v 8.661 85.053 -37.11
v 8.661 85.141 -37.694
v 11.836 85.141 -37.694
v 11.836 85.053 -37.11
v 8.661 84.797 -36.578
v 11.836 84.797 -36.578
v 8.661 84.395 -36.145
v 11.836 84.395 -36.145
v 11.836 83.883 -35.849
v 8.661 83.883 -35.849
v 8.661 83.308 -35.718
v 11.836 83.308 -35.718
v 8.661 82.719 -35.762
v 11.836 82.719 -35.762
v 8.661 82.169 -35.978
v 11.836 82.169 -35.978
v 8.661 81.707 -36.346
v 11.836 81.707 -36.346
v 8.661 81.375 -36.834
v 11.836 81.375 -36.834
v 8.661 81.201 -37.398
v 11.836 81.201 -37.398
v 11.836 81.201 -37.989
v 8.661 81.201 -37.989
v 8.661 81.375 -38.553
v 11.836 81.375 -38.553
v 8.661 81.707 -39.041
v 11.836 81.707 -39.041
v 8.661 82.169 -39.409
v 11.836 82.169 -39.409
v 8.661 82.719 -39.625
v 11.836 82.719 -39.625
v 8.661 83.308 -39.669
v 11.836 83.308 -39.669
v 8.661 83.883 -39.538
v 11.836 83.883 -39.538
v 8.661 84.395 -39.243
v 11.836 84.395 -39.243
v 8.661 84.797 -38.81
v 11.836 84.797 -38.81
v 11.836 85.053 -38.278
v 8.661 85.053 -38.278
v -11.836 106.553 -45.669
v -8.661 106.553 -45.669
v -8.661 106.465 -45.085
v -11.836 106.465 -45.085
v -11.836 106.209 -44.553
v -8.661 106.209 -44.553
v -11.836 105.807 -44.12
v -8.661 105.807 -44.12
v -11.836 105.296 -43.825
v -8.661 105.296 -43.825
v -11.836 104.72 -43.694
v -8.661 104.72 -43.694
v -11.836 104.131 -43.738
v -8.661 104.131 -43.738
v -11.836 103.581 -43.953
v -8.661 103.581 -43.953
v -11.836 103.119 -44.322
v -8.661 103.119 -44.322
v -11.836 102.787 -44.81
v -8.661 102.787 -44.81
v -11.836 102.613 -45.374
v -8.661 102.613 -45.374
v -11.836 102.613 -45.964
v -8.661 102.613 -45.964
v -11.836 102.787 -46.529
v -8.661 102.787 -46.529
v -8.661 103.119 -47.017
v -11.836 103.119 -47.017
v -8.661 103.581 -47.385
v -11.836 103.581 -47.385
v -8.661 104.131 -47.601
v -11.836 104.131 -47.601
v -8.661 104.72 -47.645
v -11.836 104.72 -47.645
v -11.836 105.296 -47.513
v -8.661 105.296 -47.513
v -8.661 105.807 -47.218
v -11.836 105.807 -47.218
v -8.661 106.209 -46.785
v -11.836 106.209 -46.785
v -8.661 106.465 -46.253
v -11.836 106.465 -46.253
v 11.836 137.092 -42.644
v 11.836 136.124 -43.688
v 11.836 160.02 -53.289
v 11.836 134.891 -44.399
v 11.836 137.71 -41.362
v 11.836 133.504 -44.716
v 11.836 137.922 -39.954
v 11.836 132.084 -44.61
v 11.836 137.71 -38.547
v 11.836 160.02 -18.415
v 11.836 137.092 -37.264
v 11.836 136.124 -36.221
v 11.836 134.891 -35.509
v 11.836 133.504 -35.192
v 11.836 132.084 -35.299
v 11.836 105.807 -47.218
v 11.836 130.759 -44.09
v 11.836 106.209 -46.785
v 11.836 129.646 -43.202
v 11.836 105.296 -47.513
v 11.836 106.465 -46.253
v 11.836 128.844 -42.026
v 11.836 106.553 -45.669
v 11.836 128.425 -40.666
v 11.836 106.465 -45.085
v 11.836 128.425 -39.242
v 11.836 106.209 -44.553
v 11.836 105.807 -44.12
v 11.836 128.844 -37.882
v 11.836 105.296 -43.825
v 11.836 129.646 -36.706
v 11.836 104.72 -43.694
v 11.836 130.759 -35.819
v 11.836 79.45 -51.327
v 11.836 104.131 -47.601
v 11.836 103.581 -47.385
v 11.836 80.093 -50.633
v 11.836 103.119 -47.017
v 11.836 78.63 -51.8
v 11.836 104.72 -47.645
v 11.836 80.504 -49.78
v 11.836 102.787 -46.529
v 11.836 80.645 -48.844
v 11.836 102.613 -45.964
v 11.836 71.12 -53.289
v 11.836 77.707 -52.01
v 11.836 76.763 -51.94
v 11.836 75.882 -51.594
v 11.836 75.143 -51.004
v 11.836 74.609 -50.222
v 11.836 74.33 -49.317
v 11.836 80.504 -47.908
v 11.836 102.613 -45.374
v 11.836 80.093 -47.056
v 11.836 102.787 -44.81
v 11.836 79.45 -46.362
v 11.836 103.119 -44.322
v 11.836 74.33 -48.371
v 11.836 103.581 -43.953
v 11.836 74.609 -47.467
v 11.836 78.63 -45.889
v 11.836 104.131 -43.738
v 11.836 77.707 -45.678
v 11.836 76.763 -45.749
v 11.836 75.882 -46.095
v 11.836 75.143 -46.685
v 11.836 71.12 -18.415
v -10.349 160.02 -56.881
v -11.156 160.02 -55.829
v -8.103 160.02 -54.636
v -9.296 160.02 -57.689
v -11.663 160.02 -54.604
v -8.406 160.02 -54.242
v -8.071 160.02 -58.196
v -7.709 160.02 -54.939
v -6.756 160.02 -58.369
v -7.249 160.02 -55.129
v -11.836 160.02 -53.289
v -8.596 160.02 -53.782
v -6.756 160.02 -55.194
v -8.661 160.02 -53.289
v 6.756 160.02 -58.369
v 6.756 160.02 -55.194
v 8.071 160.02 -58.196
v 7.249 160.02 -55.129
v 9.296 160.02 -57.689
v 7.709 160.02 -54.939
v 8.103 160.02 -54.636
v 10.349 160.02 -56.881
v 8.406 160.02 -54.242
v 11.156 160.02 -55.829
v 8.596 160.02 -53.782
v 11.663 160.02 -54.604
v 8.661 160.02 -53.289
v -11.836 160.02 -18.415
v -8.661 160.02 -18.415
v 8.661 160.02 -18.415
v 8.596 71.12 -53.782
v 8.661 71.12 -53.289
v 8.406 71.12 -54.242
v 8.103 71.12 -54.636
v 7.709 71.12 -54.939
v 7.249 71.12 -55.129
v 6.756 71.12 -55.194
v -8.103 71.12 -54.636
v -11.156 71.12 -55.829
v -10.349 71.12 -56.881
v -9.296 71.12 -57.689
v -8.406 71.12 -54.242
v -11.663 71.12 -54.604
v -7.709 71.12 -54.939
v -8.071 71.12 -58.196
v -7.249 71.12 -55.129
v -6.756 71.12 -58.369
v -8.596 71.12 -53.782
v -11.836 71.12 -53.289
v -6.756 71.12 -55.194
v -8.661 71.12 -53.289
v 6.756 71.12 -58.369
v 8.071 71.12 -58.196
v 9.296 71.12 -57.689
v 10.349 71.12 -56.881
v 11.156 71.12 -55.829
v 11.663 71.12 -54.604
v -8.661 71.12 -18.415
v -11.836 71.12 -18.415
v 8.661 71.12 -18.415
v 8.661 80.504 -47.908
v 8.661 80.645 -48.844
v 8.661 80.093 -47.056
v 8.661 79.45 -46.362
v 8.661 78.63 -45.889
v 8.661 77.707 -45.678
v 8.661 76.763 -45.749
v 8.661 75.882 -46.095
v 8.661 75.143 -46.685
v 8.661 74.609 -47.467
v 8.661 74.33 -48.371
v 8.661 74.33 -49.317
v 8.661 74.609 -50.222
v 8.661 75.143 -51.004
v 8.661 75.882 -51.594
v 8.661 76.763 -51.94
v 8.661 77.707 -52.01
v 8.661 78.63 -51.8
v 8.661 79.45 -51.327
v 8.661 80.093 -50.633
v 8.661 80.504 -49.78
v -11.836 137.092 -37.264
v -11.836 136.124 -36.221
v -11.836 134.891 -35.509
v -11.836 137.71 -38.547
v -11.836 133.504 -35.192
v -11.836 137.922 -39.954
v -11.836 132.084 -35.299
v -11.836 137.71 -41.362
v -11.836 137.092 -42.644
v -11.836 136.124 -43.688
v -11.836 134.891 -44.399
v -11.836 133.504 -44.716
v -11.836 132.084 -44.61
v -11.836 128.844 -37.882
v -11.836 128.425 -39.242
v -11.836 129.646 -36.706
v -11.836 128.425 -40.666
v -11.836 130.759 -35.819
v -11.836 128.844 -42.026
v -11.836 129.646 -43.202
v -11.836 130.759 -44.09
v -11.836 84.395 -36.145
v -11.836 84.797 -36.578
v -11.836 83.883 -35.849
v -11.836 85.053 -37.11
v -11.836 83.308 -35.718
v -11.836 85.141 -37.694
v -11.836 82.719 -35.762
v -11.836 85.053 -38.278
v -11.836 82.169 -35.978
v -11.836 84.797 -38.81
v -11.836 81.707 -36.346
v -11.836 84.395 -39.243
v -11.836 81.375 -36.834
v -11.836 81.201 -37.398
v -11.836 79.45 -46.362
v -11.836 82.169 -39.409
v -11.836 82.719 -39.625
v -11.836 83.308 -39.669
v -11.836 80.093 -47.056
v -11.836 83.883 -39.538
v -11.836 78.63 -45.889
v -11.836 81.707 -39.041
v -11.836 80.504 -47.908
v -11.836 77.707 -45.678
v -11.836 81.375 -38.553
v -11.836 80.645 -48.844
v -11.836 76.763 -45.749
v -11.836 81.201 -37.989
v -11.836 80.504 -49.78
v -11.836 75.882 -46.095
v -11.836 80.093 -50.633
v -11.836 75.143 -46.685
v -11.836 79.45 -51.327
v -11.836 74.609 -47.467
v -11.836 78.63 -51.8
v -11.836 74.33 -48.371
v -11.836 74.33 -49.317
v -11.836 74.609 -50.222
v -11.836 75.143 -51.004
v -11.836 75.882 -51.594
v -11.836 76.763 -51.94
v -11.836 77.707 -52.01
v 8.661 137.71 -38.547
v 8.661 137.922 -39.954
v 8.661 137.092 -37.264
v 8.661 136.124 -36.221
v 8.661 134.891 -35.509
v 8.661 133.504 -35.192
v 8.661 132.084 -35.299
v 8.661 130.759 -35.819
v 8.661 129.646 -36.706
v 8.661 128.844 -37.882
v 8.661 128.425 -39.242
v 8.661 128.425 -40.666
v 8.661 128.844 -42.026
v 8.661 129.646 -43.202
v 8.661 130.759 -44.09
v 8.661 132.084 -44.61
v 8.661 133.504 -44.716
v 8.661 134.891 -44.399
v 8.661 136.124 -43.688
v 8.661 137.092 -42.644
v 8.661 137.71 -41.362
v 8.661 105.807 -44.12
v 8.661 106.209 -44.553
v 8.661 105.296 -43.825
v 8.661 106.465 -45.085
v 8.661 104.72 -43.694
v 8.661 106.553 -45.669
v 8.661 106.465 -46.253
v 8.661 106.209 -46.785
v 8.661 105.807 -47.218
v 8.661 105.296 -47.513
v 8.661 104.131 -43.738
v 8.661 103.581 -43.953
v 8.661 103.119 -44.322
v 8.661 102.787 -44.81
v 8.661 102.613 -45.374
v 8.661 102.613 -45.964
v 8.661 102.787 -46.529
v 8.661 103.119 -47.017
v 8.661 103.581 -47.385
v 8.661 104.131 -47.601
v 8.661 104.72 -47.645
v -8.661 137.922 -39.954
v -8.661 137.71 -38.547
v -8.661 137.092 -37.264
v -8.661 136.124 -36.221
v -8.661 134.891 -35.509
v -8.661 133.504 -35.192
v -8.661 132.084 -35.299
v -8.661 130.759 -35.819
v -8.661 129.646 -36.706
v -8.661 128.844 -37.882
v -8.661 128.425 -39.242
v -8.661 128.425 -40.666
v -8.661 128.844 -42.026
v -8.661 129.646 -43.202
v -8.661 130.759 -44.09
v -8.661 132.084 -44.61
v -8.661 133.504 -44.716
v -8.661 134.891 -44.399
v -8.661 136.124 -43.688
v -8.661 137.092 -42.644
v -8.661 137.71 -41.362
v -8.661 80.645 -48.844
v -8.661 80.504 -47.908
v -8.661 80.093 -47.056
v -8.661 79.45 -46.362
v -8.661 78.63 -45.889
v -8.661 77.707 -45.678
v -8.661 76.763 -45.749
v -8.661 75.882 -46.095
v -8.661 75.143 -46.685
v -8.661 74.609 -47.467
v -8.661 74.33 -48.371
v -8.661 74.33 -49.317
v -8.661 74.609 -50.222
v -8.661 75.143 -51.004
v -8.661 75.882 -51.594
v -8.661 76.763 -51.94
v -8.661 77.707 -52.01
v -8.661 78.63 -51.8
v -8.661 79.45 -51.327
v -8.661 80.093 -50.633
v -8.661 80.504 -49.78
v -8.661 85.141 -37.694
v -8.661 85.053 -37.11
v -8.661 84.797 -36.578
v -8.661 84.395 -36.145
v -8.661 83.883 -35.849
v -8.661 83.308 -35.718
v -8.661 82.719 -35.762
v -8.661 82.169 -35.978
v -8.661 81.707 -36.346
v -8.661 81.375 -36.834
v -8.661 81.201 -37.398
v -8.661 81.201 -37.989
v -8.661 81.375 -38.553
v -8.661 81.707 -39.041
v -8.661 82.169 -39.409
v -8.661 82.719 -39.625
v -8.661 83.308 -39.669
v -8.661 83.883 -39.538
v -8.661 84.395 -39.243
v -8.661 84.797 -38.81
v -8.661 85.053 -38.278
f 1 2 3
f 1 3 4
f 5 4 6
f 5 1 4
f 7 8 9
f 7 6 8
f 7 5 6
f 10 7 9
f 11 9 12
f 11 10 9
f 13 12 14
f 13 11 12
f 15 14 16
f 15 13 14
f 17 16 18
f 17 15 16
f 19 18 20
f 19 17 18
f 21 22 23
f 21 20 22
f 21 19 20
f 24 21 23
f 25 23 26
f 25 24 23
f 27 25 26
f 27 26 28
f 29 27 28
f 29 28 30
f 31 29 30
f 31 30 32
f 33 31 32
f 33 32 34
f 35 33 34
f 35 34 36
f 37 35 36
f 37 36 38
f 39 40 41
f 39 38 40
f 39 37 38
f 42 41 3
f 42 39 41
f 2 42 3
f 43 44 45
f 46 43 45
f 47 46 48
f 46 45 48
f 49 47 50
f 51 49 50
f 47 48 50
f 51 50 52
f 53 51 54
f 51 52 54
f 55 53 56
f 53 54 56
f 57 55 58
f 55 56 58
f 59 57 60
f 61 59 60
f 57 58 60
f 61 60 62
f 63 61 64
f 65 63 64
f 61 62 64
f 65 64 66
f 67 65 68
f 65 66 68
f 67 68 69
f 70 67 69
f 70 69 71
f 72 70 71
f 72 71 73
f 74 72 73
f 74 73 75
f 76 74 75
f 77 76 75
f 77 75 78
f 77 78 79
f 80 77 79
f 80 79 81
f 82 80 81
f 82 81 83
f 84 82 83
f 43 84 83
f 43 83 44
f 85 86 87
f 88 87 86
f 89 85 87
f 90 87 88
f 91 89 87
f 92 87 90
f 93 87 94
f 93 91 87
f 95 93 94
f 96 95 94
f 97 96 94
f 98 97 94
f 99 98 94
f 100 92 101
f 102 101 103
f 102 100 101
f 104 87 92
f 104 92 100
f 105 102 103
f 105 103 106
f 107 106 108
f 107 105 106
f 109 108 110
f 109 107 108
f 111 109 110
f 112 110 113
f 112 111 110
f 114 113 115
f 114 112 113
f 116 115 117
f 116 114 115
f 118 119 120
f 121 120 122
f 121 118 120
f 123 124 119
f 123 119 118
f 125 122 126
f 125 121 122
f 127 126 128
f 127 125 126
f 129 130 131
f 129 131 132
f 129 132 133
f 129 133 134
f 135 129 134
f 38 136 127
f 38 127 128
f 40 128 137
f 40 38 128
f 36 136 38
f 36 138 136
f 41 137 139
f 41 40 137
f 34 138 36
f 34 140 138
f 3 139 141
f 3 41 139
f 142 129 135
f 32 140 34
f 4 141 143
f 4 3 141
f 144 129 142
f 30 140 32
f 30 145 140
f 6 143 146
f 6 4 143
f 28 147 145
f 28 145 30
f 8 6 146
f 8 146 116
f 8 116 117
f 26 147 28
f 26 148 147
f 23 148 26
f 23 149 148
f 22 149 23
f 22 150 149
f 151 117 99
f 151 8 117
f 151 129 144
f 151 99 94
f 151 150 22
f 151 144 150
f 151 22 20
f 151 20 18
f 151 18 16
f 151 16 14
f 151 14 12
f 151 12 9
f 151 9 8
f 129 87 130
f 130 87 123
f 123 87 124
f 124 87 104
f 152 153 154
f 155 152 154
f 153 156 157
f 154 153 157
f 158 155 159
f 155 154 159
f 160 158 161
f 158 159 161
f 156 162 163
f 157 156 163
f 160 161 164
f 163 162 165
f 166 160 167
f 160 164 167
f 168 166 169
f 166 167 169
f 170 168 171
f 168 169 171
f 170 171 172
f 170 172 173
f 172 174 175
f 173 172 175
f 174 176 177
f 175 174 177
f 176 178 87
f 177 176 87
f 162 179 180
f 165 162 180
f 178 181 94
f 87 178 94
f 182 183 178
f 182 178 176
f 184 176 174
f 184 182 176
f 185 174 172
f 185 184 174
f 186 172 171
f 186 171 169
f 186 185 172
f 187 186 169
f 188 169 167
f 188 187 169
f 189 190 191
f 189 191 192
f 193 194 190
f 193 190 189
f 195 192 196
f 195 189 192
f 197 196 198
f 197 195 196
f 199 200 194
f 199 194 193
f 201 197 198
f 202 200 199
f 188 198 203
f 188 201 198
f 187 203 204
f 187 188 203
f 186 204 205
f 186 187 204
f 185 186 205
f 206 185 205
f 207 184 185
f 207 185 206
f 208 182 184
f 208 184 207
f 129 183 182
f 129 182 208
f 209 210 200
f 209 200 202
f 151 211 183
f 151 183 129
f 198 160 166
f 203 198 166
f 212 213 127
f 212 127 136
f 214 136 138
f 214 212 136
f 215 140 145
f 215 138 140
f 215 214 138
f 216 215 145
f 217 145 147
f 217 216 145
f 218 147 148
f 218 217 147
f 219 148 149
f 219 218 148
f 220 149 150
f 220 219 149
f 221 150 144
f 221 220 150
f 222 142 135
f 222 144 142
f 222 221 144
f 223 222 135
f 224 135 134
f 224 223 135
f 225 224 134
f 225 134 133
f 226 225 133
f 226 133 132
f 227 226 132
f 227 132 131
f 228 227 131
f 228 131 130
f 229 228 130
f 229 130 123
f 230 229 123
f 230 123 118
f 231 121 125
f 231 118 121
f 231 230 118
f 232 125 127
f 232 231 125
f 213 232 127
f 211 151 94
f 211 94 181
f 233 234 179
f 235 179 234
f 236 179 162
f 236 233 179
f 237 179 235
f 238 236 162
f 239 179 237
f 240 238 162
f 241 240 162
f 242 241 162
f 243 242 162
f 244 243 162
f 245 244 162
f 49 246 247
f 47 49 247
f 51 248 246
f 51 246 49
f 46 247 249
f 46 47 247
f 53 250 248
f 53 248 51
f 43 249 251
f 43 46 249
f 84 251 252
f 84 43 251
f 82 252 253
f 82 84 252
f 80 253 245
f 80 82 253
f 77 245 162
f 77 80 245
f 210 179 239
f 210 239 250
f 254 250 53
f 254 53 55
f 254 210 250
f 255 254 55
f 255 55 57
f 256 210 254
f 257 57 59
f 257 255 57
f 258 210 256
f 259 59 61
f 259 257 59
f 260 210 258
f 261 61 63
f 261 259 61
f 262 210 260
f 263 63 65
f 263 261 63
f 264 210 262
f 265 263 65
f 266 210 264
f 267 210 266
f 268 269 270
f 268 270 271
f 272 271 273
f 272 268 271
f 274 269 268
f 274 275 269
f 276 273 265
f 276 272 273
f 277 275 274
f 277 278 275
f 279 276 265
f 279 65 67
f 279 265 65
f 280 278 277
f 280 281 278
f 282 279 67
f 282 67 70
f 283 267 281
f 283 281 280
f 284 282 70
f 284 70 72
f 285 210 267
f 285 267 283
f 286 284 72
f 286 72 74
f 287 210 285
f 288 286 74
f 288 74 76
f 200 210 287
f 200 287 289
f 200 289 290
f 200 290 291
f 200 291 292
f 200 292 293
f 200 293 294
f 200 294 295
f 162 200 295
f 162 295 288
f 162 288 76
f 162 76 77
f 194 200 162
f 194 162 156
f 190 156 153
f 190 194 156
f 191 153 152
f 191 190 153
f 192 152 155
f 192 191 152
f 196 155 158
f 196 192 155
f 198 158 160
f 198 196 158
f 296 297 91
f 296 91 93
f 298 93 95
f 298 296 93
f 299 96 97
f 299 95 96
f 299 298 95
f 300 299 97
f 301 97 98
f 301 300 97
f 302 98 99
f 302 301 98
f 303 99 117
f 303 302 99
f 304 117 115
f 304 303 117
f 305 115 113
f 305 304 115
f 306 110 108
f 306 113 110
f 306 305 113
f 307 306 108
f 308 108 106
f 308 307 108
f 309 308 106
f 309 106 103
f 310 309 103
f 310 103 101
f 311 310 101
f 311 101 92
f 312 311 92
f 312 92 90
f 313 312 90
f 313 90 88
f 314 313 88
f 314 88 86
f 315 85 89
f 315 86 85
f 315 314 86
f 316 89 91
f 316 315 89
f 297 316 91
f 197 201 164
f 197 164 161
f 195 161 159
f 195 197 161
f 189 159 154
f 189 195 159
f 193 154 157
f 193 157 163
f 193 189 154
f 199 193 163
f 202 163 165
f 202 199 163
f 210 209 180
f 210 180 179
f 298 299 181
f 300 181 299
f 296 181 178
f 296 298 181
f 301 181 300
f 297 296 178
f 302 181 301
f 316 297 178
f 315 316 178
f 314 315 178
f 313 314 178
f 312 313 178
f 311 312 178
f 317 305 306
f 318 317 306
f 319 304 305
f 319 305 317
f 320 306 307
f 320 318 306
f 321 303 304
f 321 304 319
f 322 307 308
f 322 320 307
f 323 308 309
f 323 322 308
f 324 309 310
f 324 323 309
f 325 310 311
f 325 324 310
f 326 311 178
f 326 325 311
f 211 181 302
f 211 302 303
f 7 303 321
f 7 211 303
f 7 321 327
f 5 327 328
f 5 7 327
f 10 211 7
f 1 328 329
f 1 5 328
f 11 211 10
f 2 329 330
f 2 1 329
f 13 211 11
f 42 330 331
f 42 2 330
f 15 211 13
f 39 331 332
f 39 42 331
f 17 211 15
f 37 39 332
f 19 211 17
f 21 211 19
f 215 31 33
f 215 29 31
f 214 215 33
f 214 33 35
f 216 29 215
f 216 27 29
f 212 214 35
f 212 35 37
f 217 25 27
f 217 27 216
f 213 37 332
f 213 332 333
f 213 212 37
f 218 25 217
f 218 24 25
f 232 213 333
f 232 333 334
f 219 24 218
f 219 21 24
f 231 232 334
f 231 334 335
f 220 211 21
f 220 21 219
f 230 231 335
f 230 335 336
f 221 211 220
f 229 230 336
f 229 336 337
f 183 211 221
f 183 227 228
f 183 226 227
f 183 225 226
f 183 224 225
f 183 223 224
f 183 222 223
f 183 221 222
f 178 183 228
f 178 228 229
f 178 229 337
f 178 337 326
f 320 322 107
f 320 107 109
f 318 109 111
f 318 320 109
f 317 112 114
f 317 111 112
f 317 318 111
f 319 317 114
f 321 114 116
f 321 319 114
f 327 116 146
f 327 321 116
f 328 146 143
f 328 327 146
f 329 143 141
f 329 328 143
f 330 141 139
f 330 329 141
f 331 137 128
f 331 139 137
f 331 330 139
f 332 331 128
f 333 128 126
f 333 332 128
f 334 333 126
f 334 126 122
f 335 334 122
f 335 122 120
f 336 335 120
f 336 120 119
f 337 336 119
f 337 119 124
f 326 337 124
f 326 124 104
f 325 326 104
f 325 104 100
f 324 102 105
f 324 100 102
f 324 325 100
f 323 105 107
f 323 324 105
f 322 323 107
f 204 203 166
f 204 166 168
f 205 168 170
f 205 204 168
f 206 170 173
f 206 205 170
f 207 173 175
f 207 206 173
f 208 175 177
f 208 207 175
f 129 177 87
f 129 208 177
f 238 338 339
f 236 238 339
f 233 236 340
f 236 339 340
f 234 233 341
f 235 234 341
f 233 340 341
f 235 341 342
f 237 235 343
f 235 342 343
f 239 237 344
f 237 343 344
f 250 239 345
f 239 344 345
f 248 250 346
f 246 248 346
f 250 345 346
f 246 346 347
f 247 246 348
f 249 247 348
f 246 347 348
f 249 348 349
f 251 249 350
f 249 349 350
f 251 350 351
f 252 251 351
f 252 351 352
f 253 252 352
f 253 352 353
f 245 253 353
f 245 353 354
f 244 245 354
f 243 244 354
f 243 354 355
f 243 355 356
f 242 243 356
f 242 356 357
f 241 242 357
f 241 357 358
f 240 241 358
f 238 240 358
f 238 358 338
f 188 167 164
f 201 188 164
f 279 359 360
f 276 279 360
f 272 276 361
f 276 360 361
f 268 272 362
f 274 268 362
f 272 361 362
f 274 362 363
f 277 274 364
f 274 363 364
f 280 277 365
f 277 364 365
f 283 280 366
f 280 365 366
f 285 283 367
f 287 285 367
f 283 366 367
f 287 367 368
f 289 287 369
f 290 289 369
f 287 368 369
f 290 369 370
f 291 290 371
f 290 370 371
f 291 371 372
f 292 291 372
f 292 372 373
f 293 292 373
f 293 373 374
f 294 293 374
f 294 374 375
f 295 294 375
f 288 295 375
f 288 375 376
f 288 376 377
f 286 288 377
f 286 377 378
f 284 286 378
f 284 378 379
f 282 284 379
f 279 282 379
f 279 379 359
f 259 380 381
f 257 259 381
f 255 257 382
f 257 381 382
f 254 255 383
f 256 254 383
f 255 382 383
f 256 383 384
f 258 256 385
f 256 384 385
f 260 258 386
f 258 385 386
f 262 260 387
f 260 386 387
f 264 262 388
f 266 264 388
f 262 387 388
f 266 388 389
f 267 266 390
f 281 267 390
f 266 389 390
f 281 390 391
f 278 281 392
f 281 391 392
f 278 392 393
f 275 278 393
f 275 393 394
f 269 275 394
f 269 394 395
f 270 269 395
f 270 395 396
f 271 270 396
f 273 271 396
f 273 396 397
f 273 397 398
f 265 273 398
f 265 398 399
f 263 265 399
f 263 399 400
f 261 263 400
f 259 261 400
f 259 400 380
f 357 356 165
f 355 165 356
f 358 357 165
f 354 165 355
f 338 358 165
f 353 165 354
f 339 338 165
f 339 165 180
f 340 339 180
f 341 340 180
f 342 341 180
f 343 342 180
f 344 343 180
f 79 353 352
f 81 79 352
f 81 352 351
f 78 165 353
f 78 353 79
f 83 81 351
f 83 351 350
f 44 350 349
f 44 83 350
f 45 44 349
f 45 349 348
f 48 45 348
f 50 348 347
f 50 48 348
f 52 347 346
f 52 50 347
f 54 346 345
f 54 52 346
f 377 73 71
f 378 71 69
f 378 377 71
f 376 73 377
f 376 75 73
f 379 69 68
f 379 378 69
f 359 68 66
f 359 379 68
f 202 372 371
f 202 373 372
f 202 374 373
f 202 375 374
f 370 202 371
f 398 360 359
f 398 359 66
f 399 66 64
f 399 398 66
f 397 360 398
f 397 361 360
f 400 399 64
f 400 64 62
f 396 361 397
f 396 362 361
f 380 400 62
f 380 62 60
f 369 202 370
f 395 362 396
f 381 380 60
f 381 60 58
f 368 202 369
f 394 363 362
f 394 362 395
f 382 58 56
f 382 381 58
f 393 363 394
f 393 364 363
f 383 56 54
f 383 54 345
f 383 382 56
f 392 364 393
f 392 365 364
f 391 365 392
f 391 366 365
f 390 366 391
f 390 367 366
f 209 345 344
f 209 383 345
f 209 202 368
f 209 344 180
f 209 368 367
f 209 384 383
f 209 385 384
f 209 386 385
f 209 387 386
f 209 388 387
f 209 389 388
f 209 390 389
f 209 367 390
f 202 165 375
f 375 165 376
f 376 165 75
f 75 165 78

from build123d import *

# Parameters (mm, degrees)
F2_START      = -71.12
F2_DEPTH      = 88.9
F0_R          = 3.175
F0_R_2        = 1.9812
F0_R_3        = 4.7752
F3_DEPTH      = 25.4
F3_DEPTH_BACK = 25.4


with BuildPart() as f2:
    # F1 (on Front) → F2 (new body)
    with BuildSketch(Plane.XZ.offset(F2_START)):
        with BuildLine():
            Line((-8.6614, -53.2892), (-8.6614, -18.415))
            Line((-8.6614, -18.415), (-11.8364, -18.415))
            Line((-11.8364, -18.415), (-11.8364, -53.2892))
            ThreePointArc((-11.8364, -53.2892), (-10.3485024484, -56.8813024484), (-6.7564, -58.3692))
            Line((-6.7564, -58.3692), (0, -58.3692))
            Line((0, -58.3692), (6.7564, -58.3692))
            ThreePointArc((6.7564, -58.3692), (10.3485024484, -56.8813024484), (11.8364, -53.2892))
            Line((11.8364, -53.2892), (11.8364, -18.415))
            Line((11.8364, -18.415), (8.6614, -18.415))
            Line((8.6614, -18.415), (8.6614, -53.2892))
            ThreePointArc((8.6614, -53.2892), (8.1034384182, -54.6362384182), (6.7564, -55.1942))
            Line((6.7564, -55.1942), (0, -55.1942))
            Line((0, -55.1942), (-6.7564, -55.1942))
            ThreePointArc((-6.7564, -55.1942), (-8.1034384182, -54.6362384182), (-8.6614, -53.2892))
        make_face()
    extrude(amount=-F2_DEPTH)

    # F0 (on Right) → F3 (cut, two sides)
    with BuildSketch(Plane.YZ) as f3_sk:
        with Locations((77.47, -48.8442)):
            Circle(F0_R)
        with Locations((83.1596, -37.6936)):
            Circle(F0_R_2)
        with Locations((104.5718, -45.6692)):
            Circle(F0_R_2)
        with Locations((133.1468, -39.9542)):
            Circle(F0_R_3)
    extrude(amount=F3_DEPTH, mode=Mode.SUBTRACT)
    extrude(f3_sk.sketch, amount=-F3_DEPTH_BACK, mode=Mode.SUBTRACT)


solid = f2.part
